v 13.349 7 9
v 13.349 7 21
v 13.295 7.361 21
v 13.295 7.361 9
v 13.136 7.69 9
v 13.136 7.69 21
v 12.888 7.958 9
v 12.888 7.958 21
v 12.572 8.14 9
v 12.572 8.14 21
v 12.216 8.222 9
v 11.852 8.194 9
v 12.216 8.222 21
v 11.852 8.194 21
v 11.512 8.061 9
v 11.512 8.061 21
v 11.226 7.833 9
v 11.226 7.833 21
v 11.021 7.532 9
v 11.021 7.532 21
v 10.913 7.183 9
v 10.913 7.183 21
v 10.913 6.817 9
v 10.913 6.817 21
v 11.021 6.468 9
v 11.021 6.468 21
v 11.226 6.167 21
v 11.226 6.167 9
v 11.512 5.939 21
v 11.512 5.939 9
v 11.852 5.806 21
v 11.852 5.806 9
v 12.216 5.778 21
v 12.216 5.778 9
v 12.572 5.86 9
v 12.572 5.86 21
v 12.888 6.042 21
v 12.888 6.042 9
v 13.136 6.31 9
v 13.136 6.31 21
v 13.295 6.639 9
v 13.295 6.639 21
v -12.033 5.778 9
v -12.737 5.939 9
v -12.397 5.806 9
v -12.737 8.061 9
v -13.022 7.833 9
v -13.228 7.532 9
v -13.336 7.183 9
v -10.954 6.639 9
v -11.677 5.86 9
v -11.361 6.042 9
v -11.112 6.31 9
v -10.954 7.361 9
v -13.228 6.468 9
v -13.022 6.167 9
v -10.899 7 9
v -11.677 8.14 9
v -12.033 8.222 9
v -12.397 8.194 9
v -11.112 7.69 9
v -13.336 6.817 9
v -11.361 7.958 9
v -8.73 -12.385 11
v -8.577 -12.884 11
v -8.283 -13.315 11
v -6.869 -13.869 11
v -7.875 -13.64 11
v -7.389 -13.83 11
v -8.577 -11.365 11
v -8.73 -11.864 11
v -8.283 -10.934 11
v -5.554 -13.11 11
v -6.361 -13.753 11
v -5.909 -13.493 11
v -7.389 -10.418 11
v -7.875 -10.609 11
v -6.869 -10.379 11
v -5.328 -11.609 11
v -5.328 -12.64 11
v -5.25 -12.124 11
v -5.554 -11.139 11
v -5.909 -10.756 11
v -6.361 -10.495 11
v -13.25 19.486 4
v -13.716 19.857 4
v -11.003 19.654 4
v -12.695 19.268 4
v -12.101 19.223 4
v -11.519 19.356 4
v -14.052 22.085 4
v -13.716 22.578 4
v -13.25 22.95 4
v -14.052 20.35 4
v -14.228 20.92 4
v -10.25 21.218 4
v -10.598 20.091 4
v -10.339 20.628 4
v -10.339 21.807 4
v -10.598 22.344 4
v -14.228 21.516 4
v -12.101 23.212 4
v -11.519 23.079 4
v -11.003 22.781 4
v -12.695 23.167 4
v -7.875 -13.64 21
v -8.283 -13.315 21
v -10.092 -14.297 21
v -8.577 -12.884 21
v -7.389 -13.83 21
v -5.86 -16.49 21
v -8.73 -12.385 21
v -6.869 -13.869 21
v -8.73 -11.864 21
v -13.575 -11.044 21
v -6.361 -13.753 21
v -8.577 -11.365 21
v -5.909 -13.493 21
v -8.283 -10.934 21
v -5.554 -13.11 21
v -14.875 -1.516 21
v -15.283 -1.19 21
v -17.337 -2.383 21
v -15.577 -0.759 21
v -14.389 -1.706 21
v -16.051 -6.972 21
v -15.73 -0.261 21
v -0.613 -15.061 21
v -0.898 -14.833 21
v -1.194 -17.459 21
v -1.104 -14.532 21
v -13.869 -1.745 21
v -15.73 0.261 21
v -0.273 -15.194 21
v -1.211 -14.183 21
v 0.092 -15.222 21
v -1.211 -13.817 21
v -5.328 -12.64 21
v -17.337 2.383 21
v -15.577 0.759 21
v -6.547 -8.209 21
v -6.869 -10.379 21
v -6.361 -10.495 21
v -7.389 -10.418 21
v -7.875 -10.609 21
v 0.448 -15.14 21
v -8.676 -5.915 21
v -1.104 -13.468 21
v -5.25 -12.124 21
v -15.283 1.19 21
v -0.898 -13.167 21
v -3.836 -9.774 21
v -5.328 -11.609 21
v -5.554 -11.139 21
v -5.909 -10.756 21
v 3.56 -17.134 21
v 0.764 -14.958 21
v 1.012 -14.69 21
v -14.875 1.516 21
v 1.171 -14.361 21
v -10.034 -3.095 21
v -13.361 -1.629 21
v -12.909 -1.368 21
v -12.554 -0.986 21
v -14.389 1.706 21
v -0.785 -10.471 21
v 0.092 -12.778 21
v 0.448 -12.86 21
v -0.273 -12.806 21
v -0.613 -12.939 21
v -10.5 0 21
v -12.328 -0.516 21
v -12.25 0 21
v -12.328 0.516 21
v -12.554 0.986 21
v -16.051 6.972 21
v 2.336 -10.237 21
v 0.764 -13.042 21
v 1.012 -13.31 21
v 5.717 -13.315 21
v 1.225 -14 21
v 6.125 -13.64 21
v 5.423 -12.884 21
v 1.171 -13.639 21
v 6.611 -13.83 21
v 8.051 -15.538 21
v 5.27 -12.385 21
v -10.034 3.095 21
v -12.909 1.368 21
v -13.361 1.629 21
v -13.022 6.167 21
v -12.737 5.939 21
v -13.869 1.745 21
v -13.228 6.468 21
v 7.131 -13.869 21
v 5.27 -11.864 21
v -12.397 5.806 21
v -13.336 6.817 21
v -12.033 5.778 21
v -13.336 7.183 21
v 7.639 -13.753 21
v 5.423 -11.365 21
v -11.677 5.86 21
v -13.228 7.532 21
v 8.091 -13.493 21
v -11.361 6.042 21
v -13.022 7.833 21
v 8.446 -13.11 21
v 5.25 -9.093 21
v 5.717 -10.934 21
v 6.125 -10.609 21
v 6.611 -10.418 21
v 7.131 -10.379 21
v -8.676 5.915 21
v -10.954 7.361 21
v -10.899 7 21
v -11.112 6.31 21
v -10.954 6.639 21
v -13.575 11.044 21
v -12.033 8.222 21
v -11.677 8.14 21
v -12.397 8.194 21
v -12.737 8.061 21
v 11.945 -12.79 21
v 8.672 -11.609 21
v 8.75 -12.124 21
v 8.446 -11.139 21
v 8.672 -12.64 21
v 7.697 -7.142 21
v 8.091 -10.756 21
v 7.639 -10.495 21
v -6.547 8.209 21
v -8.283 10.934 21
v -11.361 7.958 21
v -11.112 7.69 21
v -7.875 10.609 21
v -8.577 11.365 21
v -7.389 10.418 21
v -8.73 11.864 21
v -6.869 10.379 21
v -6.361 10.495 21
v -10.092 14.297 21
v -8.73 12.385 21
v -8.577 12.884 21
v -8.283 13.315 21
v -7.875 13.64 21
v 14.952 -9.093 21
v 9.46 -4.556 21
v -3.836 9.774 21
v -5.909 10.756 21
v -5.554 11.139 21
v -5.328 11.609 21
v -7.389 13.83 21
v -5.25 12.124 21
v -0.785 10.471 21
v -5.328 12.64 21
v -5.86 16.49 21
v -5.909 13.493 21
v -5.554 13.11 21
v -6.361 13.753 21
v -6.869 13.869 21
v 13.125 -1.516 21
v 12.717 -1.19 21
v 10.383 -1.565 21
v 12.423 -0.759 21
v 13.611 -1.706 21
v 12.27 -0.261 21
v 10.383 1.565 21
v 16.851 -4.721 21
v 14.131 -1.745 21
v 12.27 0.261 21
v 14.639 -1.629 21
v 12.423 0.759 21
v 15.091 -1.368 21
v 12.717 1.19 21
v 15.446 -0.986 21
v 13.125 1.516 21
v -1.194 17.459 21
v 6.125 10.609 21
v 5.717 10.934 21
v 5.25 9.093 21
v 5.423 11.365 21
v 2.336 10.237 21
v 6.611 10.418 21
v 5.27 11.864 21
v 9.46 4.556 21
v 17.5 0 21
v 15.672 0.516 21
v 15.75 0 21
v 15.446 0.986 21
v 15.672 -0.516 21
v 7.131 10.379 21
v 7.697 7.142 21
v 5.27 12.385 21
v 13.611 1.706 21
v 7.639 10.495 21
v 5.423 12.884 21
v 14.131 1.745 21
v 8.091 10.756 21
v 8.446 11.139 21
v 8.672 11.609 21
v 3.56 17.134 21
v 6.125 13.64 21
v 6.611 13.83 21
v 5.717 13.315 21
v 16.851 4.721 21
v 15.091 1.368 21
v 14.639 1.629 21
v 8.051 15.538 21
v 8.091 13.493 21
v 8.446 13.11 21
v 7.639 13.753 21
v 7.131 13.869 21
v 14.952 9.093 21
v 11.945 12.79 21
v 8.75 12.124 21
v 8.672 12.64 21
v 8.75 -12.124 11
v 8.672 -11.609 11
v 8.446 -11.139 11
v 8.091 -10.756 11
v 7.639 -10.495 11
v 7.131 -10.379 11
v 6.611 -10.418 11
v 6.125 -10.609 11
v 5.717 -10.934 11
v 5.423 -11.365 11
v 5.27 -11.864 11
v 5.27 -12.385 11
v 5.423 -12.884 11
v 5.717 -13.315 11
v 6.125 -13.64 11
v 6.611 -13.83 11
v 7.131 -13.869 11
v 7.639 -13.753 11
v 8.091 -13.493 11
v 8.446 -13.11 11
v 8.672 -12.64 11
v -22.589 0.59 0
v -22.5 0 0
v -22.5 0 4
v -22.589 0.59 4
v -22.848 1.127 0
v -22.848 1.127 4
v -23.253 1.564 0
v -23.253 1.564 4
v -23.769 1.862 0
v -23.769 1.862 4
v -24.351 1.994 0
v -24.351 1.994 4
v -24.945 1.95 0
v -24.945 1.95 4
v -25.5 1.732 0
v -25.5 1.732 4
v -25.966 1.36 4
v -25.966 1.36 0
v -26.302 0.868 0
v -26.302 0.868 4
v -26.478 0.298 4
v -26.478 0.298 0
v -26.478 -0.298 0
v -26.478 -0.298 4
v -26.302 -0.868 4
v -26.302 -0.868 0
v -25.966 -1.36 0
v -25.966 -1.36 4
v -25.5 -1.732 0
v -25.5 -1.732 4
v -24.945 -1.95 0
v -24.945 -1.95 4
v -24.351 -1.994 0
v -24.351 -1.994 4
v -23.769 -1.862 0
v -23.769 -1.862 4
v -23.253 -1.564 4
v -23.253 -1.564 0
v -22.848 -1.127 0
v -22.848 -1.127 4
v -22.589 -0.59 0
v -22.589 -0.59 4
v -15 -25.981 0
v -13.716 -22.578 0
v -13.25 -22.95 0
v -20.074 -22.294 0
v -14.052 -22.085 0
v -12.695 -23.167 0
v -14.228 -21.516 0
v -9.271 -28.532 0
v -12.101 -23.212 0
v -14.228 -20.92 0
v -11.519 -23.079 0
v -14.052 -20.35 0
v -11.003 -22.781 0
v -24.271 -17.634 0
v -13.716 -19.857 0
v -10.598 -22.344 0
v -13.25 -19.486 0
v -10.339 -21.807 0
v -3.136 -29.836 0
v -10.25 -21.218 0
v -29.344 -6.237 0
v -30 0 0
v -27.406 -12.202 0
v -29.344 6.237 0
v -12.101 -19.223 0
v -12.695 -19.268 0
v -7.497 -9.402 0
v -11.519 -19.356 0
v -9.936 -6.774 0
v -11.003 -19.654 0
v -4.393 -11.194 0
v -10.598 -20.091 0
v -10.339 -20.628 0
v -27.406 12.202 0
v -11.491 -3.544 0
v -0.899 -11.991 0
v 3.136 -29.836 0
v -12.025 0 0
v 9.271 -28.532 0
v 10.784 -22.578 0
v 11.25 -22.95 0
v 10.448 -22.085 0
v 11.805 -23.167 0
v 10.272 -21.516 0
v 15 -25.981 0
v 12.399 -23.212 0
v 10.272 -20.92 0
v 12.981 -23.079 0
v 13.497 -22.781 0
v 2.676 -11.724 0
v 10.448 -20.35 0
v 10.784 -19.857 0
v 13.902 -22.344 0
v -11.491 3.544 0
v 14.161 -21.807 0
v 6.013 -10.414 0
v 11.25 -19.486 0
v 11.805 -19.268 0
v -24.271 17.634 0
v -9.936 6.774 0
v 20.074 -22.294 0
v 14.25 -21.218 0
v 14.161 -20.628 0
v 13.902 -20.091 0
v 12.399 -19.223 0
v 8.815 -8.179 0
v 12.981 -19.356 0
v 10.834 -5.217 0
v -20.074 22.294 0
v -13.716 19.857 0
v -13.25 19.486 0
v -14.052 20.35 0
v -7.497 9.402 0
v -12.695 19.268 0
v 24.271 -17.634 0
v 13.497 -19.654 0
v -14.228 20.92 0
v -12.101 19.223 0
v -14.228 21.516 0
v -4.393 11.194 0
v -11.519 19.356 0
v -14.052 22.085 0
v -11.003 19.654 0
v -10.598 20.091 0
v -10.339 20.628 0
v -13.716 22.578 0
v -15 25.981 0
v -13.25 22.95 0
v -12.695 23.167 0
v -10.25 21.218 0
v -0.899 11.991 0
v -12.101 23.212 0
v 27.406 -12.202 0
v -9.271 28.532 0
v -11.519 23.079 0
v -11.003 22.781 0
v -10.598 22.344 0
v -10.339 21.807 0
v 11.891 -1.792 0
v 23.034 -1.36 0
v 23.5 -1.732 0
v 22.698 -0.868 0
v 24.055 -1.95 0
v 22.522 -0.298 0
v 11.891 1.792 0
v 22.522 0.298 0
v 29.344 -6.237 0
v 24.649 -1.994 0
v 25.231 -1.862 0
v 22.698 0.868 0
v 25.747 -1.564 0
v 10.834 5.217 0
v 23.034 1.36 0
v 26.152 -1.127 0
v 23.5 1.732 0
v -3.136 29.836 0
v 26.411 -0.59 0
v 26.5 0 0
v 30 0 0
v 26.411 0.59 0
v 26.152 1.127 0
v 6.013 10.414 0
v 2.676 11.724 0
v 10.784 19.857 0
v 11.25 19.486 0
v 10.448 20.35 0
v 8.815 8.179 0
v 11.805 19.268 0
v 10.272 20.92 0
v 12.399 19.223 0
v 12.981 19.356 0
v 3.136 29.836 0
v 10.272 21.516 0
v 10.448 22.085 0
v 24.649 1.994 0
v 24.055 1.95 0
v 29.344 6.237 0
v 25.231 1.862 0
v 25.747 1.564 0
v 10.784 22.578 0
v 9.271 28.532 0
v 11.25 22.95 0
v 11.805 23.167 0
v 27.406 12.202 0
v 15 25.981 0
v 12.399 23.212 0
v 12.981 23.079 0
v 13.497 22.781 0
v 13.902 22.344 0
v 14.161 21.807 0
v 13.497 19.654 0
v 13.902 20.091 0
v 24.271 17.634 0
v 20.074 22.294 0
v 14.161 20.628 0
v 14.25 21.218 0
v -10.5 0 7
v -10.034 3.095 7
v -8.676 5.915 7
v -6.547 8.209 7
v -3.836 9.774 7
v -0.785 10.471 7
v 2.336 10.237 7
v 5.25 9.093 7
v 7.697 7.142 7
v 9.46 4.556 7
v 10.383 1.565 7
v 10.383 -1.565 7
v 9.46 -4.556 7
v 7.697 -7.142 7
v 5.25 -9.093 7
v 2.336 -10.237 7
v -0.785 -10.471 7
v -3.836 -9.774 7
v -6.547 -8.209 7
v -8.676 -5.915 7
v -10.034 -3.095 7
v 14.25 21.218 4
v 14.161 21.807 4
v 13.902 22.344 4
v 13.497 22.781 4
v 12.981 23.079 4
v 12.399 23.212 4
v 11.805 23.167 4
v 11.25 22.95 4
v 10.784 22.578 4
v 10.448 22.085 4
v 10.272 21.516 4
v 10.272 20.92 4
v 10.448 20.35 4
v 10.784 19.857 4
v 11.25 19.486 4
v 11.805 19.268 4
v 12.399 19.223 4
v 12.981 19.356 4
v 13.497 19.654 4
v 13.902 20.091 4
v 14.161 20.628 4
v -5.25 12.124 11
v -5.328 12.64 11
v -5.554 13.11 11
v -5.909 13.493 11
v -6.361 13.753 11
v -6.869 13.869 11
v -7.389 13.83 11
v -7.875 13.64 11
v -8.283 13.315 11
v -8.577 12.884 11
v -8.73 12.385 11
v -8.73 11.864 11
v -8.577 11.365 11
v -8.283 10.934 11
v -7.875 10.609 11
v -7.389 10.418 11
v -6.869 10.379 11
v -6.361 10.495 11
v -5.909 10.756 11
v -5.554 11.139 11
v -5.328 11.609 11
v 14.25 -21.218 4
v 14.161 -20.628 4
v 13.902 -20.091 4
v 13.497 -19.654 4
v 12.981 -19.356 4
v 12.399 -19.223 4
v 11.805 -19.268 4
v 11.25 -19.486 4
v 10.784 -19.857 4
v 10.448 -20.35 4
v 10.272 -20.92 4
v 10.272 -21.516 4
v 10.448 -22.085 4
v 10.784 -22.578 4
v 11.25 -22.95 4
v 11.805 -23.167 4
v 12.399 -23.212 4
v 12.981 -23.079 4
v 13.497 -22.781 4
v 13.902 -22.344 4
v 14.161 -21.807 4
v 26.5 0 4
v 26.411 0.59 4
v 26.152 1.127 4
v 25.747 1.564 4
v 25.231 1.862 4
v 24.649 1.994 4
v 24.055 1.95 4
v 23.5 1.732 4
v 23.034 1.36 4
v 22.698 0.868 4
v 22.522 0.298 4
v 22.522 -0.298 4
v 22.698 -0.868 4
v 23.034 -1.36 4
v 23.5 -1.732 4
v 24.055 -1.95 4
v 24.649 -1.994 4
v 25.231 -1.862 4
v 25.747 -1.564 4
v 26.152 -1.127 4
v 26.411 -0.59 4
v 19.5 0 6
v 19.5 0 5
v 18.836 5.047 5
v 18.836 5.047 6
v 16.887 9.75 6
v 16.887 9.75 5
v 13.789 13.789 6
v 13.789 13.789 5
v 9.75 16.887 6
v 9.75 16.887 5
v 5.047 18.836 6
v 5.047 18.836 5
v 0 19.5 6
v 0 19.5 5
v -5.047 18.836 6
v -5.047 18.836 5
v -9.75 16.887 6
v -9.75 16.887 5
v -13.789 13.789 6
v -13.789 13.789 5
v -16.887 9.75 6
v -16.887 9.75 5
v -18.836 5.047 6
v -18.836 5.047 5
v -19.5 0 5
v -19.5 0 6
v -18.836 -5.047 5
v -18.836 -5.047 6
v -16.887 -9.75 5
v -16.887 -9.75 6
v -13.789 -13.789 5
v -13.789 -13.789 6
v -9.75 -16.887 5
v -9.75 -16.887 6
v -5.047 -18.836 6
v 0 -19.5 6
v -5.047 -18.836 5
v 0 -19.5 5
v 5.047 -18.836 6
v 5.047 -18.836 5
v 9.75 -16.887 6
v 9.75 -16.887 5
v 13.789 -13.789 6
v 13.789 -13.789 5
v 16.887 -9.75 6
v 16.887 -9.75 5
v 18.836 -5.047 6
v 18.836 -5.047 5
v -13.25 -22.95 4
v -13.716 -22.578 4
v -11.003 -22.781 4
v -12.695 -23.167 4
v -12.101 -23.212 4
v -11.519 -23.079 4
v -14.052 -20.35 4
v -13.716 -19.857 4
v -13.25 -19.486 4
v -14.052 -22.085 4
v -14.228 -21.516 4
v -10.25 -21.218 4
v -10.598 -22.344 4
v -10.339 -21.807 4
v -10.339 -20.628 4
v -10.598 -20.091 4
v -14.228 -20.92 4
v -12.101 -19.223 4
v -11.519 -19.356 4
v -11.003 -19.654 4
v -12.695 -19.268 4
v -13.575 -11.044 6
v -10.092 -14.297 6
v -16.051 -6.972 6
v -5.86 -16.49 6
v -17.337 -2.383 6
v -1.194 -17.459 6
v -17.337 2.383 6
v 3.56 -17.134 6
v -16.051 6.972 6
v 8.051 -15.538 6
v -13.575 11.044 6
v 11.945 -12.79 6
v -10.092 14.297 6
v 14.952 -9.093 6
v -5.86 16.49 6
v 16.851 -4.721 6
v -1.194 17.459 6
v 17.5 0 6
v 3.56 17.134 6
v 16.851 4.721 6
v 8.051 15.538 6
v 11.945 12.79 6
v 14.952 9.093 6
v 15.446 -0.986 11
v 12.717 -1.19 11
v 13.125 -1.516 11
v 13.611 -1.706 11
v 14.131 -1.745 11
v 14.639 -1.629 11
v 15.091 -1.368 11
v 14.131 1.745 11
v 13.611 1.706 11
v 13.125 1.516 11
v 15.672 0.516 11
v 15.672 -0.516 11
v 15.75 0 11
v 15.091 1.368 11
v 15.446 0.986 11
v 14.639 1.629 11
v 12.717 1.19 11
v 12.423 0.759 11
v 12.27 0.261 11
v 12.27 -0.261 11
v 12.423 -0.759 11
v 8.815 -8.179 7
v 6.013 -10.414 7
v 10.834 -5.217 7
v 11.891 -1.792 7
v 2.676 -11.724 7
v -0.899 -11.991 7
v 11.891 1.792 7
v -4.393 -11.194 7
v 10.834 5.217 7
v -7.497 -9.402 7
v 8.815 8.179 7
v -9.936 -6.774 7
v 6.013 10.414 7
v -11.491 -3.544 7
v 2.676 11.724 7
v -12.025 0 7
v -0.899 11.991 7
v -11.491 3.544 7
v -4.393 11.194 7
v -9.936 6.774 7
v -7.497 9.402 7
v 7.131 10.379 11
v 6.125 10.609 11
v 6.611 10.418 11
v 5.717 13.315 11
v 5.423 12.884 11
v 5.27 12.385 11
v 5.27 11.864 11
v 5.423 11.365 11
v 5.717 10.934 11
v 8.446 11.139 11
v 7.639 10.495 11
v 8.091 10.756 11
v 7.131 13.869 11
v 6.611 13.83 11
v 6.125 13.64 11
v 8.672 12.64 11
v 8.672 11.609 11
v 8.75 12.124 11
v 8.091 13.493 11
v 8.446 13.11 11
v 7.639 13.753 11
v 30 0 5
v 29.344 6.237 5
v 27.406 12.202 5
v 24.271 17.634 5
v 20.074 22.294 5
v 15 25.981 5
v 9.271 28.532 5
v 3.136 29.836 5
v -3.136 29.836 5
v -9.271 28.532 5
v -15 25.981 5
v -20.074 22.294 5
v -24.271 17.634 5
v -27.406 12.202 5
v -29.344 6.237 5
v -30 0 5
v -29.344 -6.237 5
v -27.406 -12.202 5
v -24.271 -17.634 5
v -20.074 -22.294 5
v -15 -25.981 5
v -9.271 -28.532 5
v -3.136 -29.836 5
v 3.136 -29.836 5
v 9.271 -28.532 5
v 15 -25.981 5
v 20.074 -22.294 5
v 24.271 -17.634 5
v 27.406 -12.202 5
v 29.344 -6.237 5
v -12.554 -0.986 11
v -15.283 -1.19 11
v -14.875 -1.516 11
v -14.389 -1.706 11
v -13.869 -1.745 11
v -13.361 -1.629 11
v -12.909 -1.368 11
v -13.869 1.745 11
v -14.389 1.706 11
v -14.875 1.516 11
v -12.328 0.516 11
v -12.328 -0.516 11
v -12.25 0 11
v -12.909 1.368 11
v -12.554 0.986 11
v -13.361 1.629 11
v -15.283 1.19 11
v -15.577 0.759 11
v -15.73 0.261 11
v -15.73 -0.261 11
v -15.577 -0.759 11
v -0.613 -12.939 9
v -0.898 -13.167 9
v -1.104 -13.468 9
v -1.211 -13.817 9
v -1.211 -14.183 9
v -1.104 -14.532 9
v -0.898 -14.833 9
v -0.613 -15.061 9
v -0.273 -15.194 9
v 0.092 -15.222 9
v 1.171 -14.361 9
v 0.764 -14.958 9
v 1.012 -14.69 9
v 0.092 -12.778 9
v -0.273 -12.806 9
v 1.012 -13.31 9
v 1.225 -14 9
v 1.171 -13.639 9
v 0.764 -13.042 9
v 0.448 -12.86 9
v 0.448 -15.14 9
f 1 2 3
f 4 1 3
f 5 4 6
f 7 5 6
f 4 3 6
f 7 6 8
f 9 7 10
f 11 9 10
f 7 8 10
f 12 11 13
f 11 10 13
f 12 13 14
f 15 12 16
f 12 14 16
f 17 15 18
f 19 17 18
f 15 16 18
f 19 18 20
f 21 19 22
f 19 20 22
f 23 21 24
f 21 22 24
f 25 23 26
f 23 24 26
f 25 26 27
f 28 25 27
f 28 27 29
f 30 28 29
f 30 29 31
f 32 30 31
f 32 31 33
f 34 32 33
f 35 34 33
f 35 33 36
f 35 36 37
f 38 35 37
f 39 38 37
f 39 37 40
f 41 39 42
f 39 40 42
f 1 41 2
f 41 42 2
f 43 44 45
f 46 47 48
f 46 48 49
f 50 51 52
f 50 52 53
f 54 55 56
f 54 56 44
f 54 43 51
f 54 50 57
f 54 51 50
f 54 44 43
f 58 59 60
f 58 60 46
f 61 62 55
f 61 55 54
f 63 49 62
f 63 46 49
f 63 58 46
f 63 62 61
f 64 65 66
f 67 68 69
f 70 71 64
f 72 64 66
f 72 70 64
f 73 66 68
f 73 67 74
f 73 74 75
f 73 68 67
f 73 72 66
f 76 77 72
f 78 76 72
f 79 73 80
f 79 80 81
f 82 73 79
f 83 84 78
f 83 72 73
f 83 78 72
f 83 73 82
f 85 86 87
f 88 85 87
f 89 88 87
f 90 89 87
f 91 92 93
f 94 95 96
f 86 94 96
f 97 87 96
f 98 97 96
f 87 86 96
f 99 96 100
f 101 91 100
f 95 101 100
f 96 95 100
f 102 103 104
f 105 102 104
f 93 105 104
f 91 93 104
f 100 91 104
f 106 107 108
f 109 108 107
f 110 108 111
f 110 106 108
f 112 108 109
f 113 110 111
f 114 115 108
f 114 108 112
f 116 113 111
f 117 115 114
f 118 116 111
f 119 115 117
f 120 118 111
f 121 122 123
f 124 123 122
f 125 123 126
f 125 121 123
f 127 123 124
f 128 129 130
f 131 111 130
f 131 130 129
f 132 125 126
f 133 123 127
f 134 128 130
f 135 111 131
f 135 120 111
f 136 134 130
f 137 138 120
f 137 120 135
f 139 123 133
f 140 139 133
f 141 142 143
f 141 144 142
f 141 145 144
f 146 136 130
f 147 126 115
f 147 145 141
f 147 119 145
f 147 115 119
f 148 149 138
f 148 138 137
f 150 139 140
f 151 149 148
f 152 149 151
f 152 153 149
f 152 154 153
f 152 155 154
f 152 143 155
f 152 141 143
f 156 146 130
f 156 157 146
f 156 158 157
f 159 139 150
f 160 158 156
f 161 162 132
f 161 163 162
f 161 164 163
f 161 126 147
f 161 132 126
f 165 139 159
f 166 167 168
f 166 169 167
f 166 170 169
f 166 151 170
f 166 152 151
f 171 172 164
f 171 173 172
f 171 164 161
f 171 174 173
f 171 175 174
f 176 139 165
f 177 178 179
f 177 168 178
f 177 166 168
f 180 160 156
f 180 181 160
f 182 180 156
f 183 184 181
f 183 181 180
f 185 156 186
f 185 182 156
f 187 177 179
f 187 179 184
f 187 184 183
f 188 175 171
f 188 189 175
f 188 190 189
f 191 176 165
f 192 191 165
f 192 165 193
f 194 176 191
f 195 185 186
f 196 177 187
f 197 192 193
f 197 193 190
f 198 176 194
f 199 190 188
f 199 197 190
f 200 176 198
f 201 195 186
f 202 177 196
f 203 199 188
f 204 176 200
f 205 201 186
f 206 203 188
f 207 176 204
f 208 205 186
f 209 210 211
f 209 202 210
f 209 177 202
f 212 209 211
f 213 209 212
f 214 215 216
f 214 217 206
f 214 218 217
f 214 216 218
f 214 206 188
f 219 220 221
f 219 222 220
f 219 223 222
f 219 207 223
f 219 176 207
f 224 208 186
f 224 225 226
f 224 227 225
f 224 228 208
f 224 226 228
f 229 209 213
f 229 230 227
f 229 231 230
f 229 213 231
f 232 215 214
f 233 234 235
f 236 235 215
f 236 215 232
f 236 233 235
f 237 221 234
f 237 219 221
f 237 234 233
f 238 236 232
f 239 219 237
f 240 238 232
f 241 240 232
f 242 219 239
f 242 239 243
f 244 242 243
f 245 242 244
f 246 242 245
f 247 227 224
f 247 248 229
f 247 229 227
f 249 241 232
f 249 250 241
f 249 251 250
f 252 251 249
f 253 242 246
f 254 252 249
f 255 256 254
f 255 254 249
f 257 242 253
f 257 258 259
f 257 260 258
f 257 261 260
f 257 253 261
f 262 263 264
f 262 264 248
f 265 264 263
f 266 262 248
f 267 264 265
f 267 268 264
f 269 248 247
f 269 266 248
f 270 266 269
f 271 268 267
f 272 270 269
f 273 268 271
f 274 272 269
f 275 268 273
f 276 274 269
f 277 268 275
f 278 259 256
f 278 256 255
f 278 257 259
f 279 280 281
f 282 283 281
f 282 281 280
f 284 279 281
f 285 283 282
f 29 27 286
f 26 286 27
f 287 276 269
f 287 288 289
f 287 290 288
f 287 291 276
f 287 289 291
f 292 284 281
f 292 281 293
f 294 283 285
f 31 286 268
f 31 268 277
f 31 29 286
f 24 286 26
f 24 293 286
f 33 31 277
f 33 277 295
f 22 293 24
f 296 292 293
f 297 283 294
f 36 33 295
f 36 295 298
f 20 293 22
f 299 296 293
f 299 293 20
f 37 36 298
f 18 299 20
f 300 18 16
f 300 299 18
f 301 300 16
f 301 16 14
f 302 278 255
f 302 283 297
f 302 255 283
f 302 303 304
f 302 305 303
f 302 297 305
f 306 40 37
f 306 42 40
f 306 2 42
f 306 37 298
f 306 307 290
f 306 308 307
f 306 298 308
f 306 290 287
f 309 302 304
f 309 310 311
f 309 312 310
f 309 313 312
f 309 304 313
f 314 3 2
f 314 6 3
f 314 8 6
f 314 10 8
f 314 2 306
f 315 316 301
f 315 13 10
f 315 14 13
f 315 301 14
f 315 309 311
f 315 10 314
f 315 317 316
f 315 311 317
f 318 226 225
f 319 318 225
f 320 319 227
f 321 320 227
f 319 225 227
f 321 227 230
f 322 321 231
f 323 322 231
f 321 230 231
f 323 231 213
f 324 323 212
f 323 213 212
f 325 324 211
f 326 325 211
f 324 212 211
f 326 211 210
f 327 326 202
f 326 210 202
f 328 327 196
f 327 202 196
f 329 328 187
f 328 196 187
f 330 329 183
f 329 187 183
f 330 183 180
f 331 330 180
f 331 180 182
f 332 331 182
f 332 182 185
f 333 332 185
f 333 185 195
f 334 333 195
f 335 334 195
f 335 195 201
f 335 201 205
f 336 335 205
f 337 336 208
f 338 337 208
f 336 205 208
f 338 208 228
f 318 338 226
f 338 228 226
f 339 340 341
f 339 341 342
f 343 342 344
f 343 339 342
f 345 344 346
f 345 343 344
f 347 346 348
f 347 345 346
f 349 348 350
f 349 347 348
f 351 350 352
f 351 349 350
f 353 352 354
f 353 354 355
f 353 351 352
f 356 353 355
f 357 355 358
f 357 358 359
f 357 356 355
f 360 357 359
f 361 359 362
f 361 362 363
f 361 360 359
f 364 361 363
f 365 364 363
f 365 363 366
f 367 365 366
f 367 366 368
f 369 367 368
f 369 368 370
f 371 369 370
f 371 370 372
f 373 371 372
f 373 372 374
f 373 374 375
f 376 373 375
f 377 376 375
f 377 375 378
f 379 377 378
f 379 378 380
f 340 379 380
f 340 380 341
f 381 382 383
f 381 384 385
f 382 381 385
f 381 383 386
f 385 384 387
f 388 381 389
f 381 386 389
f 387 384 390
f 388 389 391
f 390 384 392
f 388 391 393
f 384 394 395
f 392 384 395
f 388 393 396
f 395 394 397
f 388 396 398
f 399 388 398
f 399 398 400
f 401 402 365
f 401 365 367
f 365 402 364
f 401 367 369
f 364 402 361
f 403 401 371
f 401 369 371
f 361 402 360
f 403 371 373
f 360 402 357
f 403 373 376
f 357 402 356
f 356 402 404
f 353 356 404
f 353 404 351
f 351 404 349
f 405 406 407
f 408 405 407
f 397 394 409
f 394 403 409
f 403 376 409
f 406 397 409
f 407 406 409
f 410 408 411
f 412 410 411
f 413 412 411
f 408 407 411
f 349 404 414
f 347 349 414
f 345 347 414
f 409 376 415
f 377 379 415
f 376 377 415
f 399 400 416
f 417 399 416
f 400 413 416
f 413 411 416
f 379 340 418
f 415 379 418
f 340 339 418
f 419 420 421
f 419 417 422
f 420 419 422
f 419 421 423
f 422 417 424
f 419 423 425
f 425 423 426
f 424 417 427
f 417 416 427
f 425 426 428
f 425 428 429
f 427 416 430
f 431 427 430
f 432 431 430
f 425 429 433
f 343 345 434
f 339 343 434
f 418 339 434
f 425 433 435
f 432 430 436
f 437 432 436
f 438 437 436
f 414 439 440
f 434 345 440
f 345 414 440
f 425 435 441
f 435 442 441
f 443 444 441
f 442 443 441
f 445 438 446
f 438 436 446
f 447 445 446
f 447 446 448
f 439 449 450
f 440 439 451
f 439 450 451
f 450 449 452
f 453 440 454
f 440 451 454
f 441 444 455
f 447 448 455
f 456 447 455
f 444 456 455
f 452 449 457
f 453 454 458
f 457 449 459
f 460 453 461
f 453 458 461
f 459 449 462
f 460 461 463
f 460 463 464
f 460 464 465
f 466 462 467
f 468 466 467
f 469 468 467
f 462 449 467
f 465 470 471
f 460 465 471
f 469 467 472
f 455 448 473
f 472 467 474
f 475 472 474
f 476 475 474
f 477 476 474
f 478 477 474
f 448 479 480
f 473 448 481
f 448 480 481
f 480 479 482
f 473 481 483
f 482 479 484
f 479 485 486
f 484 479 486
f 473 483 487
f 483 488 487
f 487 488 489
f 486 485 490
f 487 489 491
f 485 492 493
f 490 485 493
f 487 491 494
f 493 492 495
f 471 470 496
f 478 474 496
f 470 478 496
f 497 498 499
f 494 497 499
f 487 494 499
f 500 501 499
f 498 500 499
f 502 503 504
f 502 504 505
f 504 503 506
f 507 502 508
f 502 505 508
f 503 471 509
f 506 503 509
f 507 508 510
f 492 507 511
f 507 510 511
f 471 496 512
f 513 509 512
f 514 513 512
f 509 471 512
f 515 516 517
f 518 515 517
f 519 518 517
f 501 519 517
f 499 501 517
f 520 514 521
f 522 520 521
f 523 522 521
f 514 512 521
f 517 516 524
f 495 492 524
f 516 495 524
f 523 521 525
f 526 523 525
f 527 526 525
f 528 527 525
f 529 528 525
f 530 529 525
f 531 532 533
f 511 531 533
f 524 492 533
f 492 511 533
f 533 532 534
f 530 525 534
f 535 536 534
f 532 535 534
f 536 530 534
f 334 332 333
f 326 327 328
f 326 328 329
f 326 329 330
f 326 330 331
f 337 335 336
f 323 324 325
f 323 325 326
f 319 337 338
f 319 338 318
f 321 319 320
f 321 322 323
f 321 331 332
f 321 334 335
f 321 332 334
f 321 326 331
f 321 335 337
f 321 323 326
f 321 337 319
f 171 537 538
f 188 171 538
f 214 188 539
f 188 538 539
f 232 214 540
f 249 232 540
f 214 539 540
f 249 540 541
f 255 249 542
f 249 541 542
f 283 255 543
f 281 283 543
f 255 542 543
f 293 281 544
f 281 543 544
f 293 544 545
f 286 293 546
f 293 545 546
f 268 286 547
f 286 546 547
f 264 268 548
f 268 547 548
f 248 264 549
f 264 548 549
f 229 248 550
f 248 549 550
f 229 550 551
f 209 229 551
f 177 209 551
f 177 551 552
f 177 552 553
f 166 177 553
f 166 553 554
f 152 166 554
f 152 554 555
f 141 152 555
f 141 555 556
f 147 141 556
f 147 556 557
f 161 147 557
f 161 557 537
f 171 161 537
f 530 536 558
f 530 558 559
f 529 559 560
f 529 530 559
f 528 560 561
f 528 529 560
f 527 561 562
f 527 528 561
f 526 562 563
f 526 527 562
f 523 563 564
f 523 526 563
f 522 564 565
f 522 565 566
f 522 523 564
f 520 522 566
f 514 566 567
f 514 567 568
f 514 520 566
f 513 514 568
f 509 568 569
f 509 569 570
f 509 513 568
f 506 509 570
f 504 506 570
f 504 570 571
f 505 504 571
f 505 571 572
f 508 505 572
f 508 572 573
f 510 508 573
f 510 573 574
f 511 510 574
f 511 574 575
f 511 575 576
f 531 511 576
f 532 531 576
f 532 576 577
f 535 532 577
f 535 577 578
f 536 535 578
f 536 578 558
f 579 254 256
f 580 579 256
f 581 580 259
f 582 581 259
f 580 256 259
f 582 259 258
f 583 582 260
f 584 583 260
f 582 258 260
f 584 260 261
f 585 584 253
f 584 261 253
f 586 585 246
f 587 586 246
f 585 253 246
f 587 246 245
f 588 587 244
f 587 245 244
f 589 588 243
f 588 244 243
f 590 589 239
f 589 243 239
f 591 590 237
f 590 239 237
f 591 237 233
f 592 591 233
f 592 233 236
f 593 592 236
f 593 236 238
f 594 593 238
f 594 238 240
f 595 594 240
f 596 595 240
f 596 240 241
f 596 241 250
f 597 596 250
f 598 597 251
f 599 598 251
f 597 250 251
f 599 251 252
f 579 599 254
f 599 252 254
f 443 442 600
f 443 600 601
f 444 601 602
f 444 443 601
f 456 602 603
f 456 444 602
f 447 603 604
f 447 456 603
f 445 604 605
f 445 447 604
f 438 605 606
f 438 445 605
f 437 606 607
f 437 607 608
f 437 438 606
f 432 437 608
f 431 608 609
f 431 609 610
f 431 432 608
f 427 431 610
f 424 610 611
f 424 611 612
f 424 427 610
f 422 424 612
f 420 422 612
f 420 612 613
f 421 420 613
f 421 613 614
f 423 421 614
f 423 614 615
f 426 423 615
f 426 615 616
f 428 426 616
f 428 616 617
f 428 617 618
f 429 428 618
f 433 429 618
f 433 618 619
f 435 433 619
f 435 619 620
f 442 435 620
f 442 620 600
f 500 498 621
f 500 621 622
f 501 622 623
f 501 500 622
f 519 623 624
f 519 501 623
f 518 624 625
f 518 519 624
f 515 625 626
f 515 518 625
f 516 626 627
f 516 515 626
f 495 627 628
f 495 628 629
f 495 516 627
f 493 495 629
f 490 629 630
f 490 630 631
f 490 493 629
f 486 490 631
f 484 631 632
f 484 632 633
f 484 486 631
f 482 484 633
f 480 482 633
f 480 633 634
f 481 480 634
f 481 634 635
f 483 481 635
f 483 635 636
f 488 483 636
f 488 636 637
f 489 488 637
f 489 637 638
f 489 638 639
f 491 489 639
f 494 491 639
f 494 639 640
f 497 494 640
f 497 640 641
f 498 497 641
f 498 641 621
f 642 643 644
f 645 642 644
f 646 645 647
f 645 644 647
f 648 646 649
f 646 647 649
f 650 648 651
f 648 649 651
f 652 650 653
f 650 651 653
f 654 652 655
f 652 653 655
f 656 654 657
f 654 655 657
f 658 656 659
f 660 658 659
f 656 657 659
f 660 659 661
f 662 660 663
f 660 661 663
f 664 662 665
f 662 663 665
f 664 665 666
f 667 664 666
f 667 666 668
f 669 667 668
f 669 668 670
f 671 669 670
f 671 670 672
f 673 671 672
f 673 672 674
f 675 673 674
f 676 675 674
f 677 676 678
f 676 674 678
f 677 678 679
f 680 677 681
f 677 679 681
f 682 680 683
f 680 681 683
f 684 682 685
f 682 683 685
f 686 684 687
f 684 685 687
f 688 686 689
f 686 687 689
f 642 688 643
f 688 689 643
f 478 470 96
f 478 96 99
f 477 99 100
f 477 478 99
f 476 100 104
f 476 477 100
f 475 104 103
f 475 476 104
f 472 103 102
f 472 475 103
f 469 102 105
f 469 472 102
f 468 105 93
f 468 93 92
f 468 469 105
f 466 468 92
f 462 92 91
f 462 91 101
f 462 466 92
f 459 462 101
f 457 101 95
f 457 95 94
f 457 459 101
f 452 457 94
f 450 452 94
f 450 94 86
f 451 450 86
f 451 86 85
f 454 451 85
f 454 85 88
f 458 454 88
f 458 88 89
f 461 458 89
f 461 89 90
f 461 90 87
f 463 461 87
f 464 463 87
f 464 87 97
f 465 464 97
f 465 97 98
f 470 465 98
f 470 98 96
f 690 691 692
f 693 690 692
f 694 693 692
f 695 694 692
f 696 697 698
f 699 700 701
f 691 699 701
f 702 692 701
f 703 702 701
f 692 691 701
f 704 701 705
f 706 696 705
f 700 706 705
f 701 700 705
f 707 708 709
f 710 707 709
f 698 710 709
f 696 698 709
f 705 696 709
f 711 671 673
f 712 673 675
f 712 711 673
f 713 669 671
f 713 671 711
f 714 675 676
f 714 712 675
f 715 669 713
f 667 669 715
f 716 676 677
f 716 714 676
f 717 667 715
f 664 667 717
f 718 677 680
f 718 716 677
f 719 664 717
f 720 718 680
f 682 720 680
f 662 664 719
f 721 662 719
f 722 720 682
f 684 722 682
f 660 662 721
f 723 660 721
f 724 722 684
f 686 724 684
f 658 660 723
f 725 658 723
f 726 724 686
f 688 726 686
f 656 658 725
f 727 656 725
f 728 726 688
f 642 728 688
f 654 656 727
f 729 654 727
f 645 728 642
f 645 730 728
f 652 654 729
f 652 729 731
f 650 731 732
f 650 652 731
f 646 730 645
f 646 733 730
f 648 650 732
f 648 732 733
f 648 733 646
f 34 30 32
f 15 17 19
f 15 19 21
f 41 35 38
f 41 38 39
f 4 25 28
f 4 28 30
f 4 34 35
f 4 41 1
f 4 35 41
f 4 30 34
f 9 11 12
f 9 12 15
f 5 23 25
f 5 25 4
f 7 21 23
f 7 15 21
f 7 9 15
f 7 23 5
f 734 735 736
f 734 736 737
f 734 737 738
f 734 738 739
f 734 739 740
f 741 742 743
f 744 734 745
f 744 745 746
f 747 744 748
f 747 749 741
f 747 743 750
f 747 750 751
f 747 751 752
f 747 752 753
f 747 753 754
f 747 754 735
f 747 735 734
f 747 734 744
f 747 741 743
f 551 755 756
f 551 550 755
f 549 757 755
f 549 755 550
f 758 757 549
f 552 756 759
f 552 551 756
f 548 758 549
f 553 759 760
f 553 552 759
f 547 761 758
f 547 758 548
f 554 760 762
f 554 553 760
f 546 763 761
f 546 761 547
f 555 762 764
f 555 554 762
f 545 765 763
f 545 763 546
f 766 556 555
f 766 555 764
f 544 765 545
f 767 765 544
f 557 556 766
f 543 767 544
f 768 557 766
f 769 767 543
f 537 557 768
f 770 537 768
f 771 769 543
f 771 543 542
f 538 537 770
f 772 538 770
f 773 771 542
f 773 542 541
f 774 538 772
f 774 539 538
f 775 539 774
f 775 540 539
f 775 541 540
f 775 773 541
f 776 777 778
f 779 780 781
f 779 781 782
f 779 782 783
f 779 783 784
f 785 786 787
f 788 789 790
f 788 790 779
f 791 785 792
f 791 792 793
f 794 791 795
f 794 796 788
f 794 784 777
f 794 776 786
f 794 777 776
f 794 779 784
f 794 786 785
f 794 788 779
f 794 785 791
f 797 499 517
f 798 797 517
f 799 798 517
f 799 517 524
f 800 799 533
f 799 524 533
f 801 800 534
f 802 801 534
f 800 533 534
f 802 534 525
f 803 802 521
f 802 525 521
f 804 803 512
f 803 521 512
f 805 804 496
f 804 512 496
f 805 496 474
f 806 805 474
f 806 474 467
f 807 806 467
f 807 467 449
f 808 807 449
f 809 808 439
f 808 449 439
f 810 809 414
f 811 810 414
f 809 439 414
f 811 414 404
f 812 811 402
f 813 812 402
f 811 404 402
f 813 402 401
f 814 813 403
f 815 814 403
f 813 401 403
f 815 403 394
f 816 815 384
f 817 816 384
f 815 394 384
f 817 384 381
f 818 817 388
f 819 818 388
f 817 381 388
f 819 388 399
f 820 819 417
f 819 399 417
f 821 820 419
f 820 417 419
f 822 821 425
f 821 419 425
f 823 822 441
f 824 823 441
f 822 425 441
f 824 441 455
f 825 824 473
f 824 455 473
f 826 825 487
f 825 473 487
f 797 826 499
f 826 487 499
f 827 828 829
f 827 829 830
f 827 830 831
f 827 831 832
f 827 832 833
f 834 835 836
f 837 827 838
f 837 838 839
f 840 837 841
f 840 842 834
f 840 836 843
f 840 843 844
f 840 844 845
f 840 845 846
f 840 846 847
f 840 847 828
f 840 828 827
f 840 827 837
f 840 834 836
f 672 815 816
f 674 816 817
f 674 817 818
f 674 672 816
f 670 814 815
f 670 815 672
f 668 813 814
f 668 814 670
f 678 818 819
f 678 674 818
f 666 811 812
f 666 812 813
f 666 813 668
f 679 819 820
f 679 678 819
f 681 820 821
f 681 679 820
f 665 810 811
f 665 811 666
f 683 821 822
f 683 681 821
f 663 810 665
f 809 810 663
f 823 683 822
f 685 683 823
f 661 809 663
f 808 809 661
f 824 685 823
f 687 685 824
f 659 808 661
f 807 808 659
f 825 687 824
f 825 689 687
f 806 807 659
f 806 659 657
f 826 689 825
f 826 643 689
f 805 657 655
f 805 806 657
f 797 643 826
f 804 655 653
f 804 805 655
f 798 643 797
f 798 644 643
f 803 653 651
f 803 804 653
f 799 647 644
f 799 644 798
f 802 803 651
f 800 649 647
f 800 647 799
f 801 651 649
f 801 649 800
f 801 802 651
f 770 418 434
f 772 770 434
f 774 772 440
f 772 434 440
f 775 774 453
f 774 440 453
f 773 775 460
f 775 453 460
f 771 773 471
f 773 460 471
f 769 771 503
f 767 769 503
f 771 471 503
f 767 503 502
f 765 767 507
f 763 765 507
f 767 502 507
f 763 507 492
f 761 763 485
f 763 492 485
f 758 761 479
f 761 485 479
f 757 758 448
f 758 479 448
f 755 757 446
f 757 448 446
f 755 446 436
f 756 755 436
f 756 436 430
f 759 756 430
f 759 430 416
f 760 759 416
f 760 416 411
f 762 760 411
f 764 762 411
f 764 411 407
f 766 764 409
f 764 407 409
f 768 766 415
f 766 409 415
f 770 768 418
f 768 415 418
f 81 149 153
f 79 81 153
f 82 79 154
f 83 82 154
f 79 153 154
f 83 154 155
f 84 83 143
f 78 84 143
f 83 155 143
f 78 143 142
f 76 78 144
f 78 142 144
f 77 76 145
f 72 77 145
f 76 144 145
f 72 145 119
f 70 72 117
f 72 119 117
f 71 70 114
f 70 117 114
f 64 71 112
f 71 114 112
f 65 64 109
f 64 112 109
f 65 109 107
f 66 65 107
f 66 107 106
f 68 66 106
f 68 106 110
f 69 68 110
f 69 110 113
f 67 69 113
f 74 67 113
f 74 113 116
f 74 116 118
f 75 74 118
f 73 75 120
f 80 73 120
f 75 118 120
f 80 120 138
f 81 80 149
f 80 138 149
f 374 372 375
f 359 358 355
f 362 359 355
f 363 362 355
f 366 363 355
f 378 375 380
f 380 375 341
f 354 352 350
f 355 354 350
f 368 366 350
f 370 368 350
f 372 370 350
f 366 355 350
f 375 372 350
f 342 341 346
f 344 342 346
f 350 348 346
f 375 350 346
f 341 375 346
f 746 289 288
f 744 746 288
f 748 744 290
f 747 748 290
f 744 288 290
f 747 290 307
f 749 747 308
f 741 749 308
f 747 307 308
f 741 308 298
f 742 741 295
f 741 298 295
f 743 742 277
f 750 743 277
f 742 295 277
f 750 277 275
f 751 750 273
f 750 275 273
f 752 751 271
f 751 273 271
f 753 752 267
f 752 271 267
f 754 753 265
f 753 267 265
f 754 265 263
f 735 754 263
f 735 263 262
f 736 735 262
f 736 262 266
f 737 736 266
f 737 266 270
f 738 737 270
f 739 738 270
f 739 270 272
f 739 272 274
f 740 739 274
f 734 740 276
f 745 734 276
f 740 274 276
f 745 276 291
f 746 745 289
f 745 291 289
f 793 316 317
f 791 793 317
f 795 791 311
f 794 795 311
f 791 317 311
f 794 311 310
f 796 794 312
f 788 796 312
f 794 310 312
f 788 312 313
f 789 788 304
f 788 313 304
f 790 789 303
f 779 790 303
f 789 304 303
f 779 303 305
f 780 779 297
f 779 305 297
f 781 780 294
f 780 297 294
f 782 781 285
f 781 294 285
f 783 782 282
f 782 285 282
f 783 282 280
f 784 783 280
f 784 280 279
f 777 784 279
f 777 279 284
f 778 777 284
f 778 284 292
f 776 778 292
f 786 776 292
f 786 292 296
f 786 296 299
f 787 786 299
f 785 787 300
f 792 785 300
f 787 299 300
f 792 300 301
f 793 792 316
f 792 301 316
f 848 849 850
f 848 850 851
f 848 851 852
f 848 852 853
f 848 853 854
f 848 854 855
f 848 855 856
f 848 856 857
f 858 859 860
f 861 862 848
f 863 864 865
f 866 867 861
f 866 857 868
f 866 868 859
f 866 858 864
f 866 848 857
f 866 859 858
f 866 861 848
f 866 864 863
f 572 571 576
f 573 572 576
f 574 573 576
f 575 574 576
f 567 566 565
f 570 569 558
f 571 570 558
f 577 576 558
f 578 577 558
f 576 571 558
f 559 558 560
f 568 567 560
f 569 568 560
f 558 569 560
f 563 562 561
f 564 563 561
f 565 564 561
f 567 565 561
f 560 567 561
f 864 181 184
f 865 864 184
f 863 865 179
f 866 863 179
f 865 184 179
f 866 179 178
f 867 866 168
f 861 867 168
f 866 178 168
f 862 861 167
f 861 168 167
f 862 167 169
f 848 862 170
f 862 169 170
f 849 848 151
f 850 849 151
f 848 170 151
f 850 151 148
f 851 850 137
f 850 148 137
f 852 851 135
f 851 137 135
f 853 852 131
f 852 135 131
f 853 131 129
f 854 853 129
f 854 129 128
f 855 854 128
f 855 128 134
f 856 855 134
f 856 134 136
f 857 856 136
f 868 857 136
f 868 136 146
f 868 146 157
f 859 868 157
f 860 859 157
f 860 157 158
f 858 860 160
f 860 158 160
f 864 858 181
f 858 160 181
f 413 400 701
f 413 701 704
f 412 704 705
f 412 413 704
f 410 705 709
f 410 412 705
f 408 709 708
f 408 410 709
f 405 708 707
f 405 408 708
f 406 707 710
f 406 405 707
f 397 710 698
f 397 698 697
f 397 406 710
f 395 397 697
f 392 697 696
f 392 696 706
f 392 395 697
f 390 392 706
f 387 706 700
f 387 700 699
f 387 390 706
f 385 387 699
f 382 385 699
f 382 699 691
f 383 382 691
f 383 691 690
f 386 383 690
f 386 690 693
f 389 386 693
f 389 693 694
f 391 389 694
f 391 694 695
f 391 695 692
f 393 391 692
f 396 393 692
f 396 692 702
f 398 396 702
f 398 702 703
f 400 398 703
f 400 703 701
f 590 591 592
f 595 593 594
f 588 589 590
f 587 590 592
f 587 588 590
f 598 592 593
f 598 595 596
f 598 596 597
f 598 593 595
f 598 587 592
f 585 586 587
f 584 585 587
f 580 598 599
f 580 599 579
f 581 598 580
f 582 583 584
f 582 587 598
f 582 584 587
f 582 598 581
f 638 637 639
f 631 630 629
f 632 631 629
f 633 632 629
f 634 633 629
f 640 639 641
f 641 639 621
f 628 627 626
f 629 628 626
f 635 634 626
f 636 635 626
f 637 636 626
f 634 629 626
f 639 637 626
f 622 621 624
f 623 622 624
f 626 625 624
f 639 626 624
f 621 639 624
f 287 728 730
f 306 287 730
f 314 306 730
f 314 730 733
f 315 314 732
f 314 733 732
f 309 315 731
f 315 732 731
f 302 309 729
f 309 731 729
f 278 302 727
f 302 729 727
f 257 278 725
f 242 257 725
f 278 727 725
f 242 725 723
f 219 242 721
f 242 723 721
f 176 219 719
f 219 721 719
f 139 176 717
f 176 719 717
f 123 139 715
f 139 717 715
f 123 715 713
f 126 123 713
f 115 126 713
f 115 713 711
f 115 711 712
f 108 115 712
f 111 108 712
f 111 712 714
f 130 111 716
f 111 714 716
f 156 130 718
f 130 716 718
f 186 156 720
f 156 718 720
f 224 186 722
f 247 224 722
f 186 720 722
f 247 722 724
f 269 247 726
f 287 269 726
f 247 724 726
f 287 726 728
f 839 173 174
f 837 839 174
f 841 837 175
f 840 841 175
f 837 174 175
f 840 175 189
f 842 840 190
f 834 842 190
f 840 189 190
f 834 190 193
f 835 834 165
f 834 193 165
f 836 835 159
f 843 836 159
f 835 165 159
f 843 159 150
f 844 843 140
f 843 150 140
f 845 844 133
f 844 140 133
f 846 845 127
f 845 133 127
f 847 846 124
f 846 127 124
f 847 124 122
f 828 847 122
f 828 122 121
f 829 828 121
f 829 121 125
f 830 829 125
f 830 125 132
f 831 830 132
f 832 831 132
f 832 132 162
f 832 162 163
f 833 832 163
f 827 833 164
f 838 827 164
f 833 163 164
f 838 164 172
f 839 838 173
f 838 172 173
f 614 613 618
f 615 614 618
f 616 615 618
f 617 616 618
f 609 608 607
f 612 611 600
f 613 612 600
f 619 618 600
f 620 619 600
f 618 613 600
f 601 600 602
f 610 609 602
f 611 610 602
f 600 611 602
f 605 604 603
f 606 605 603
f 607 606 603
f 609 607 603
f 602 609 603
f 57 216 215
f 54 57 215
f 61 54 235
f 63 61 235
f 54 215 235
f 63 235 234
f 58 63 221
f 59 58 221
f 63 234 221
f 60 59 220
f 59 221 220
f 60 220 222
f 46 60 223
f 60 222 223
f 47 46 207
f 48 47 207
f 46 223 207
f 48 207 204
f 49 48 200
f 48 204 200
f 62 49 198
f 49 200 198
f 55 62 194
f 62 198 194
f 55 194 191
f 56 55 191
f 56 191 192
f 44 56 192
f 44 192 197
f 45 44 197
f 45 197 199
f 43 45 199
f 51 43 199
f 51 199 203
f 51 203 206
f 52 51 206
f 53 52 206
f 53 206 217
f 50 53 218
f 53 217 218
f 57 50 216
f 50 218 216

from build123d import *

# Parameters (mm, degrees)
SKETCH1_R               = 30
BOSS_EXTRUDE1_DEPTH     = 5
SKETCH2_R               = 19.5
BOSS_EXTRUDE2_DEPTH     = 1
SKETCH3_R               = 17.5
BOSS_EXTRUDE3_DEPTH     = 15
SKETCH4_R               = 12.025
CUT_EXTRUDE1_DEPTH      = 7
SKETCH5_R               = 10.5
CUT_EXTRUDE2_DEPTH      = 45.676615807
CUT_EXTRUDE3_DEPTH      = 4
CUT_EXTRUDE3_DEPTH_BACK = 4
CUT_EXTRUDE3_START      = -5
SKETCH6_R               = 2
SKETCH7_R               = 1.75
CUT_EXTRUDE4_DEPTH      = 10
SKETCH8_R               = 1.225
CUT_EXTRUDE5_DEPTH      = 12


with BuildPart() as part:
    # Sketch1 → Boss-Extrude1 (new body)
    with BuildSketch(Plane.XY):
        Circle(SKETCH1_R)
    extrude(amount=BOSS_EXTRUDE1_DEPTH)

    # Sketch2 → Boss-Extrude2 (add)
    with BuildSketch(Plane.XY.offset(5)):
        Circle(SKETCH2_R)
    extrude(amount=BOSS_EXTRUDE2_DEPTH)

    # Sketch3 → Boss-Extrude3 (add)
    with BuildSketch(Plane.XY.offset(6)):
        Circle(SKETCH3_R)
    extrude(amount=BOSS_EXTRUDE3_DEPTH)

    # Sketch4 → Cut-Extrude1 (cut)
    with BuildSketch(Plane(origin=(0, 0, 0), x_dir=(-1, 0, 0), z_dir=(0, 0, -1))):
        Circle(SKETCH4_R)
    extrude(amount=-CUT_EXTRUDE1_DEPTH, mode=Mode.SUBTRACT)

    # Sketch5 → Cut-Extrude2 (cut, through all)
    with BuildSketch(Plane(origin=(0, 0, 7), x_dir=(-1, 0, 0), z_dir=(0, 0, -1))):
        Circle(SKETCH5_R)
    extrude(amount=-CUT_EXTRUDE2_DEPTH, mode=Mode.SUBTRACT)

    # Sketch6 → Cut-Extrude3 (cut, two sides: drawn at the far end of the back side and taken through both)
    with BuildSketch(Plane.XY.offset(5).offset(CUT_EXTRUDE3_START - CUT_EXTRUDE3_DEPTH_BACK)):
        with Locations((24.5, 0)):
            Circle(SKETCH6_R)
        with Locations((12.25, -21.217622393)):
            Circle(SKETCH6_R)
        with Locations((-12.25, -21.217622393)):
            Circle(SKETCH6_R)
        with Locations((-24.5, 0)):
            Circle(SKETCH6_R)
        with Locations((-12.25, 21.217622393)):
            Circle(SKETCH6_R)
        with Locations((12.25, 21.217622393)):
            Circle(SKETCH6_R)
    extrude(amount=CUT_EXTRUDE3_DEPTH + CUT_EXTRUDE3_DEPTH_BACK, mode=Mode.SUBTRACT)

    # Sketch7 → Cut-Extrude4 (cut)
    with BuildSketch(Plane.XY.offset(21)):
        with Locations((14, 0)):
            Circle(SKETCH7_R)
        with Locations((7, -12.124355653)):
            Circle(SKETCH7_R)
        with Locations((-7, -12.124355653)):
            Circle(SKETCH7_R)
        with Locations((-14, 0)):
            Circle(SKETCH7_R)
        with Locations((-7, 12.124355653)):
            Circle(SKETCH7_R)
        with Locations((7, 12.124355653)):
            Circle(SKETCH7_R)
    extrude(amount=-CUT_EXTRUDE4_DEPTH, mode=Mode.SUBTRACT)

    # Sketch8 → Cut-Extrude5 (cut)
    with BuildSketch(Plane.XY.offset(21)):
        with Locations((12.124355653, 7)):
            Circle(SKETCH8_R)
        with Locations((0, -14)):
            Circle(SKETCH8_R)
        with Locations((-12.124355653, 7)):
            Circle(SKETCH8_R)
    extrude(amount=-CUT_EXTRUDE5_DEPTH, mode=Mode.SUBTRACT)


solid = part.part
